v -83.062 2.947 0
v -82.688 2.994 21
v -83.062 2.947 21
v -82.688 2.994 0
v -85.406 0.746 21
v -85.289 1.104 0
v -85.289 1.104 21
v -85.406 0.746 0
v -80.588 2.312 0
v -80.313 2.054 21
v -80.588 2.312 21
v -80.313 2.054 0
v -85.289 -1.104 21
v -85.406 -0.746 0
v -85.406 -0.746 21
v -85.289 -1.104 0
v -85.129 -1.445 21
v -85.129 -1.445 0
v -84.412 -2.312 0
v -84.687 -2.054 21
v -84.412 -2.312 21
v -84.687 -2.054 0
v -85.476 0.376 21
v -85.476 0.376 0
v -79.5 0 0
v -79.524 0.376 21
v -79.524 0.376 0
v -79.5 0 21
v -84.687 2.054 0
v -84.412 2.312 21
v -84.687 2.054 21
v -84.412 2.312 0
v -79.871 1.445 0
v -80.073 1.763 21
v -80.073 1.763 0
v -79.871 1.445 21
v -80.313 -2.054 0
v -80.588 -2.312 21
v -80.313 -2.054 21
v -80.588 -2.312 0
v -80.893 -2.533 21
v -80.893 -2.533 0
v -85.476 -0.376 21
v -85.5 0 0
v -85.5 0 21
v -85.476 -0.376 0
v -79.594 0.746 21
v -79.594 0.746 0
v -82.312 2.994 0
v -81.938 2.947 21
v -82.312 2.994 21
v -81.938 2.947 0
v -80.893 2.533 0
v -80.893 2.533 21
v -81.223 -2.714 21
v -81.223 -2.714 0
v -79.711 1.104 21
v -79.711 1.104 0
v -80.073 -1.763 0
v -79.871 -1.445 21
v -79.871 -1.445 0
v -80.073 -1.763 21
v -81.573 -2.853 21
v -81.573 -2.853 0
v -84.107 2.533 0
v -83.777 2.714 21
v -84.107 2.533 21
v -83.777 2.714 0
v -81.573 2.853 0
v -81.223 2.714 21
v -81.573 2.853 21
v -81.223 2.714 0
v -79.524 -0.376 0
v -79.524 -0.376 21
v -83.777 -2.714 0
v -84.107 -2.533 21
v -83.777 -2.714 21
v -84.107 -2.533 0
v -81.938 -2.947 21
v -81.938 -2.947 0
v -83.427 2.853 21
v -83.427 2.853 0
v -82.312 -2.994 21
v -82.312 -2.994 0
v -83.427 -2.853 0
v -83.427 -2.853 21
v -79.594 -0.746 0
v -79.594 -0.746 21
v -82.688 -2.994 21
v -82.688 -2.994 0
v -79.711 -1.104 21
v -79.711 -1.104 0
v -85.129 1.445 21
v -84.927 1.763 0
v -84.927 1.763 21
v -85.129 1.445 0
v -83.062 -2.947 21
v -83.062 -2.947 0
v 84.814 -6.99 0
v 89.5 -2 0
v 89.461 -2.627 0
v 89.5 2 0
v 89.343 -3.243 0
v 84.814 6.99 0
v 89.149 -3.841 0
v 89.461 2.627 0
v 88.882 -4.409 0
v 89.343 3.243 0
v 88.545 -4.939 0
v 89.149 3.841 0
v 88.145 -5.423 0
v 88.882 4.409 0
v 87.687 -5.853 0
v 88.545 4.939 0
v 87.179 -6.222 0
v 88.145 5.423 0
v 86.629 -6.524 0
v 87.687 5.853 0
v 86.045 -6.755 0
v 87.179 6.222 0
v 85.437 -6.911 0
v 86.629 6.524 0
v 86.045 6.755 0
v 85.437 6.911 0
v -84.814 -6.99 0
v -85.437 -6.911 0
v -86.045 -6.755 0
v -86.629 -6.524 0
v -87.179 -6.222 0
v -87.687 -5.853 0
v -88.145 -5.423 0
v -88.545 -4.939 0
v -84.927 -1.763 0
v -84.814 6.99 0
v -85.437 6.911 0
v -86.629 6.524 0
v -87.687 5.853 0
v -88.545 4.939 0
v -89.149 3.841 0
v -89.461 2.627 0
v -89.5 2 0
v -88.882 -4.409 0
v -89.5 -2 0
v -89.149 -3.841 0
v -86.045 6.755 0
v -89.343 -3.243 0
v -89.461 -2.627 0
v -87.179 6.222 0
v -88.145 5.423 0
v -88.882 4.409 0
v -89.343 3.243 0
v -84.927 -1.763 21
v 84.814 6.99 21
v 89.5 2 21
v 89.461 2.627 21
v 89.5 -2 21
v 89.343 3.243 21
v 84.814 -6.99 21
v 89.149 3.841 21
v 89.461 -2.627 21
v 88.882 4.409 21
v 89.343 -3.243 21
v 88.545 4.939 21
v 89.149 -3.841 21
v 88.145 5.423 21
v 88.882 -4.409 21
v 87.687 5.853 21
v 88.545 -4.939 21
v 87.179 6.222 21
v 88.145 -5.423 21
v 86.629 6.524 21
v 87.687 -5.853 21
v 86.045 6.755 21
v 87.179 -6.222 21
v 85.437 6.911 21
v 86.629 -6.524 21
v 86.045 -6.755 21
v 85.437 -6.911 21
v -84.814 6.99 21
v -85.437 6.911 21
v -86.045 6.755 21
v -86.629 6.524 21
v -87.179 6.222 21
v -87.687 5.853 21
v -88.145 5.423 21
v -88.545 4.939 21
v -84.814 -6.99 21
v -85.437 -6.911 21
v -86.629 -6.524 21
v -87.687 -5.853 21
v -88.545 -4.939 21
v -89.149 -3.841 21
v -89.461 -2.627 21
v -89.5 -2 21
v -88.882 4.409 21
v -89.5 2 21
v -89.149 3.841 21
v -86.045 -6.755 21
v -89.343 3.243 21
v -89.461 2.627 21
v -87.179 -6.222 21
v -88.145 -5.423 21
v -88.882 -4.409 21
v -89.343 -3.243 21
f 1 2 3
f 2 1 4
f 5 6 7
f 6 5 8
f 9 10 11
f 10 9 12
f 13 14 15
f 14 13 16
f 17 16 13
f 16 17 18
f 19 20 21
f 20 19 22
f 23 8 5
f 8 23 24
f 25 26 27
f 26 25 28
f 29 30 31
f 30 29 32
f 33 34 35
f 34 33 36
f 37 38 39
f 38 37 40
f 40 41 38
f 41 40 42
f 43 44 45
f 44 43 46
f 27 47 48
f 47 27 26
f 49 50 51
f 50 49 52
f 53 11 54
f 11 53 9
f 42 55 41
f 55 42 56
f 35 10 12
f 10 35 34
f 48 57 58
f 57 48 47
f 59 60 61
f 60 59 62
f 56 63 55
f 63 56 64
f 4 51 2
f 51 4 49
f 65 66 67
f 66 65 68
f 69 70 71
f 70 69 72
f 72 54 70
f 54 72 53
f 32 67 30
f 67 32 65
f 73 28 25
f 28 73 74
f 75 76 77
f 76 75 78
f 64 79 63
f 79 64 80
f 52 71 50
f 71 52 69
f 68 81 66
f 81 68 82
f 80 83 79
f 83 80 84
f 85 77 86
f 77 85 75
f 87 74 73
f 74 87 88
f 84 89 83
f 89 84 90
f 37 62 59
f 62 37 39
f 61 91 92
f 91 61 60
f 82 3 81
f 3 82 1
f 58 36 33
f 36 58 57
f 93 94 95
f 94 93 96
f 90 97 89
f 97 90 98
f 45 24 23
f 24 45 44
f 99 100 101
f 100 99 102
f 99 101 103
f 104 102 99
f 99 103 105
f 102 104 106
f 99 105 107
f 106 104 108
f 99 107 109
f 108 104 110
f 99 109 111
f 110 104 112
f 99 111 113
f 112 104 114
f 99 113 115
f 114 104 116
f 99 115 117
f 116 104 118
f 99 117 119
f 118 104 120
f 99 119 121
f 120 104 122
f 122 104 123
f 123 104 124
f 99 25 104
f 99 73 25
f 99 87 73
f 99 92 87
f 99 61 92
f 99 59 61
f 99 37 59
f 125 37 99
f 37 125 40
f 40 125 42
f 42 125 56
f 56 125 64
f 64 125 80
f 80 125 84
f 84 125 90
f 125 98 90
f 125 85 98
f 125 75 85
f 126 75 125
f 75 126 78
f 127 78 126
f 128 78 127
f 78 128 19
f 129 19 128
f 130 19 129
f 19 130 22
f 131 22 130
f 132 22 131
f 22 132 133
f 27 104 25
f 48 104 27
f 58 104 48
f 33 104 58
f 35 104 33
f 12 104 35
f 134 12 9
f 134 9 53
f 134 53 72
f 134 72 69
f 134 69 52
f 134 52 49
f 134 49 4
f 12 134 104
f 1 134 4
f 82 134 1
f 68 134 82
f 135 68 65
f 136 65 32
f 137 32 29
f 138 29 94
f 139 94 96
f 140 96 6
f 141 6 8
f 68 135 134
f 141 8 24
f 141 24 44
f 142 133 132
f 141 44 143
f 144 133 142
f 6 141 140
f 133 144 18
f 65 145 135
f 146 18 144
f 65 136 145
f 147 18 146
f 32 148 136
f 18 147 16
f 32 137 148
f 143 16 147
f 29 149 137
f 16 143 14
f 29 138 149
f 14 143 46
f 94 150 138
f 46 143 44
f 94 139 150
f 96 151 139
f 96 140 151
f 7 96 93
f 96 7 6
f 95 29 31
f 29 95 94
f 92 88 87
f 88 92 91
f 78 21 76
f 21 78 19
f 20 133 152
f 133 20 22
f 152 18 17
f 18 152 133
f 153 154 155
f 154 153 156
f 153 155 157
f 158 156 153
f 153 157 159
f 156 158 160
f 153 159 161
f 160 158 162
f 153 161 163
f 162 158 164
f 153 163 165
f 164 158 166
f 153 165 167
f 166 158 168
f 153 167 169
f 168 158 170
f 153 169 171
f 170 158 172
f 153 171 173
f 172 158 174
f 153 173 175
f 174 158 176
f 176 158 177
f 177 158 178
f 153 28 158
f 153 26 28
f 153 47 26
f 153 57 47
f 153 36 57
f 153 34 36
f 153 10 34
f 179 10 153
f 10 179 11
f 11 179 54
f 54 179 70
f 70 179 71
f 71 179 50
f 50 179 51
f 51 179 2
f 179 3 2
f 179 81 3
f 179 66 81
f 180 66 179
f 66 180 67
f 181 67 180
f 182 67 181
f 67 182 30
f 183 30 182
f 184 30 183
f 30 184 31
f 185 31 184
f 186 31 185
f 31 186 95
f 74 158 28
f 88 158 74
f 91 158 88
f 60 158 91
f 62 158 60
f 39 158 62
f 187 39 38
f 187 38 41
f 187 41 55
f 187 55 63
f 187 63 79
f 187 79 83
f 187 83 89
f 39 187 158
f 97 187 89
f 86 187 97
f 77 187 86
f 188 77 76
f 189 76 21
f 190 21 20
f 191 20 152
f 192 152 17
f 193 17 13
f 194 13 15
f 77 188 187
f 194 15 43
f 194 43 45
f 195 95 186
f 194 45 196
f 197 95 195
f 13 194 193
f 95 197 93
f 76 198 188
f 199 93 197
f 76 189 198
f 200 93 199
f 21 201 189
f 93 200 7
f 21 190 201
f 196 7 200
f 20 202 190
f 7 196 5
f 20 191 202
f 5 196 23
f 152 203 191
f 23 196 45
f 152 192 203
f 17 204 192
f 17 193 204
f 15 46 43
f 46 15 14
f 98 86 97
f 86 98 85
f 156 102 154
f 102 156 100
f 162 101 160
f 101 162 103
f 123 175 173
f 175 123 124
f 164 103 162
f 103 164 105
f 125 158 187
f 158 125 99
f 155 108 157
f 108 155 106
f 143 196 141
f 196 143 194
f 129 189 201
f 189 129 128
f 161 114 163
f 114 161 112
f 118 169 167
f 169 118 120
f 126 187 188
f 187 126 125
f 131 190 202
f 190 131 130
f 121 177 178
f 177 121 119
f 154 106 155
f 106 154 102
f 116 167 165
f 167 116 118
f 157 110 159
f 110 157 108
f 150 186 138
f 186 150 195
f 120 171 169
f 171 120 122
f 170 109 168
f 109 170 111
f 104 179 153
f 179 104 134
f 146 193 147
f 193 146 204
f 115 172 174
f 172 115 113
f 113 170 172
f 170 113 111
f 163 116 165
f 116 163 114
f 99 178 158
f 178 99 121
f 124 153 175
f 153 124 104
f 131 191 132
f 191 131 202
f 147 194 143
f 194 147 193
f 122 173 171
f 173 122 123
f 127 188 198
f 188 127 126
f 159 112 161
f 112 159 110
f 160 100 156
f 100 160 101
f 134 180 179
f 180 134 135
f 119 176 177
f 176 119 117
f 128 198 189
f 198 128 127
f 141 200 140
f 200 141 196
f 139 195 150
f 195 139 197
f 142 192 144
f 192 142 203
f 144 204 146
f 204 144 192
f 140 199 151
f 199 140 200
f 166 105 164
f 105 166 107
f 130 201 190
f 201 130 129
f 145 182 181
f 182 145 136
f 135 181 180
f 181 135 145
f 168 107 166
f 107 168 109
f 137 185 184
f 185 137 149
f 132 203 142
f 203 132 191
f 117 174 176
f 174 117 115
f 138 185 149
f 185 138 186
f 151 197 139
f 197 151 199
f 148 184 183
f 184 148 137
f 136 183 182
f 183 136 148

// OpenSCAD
$fn = 50;


difference() {
	union() {
		hull() {
			translate(v = [-84.5000000000, 2.0000000000, 0]) {
				cylinder(h = 21, r = 5);
			}
			translate(v = [84.5000000000, 2.0000000000, 0]) {
				cylinder(h = 21, r = 5);
			}
			translate(v = [-84.5000000000, -2.0000000000, 0]) {
				cylinder(h = 21, r = 5);
			}
			translate(v = [84.5000000000, -2.0000000000, 0]) {
				cylinder(h = 21, r = 5);
			}
		}
	}
	union() {
		translate(v = [-82.5000000000, 0.0000000000, 0]) {
			cylinder(h = 21, r = 3.0000000000);
		}
		translate(v = [-82.5000000000, 0.0000000000, 0]) {
			cylinder(h = 21, r = 1.5000000000);
		}
		translate(v = [-82.5000000000, 0.0000000000, 0]) {
			cylinder(h = 21, r = 1.5000000000);
		}
		translate(v = [-82.5000000000, 0.0000000000, 0]) {
			cylinder(h = 21, r = 1.5000000000);
		}
	}
}
